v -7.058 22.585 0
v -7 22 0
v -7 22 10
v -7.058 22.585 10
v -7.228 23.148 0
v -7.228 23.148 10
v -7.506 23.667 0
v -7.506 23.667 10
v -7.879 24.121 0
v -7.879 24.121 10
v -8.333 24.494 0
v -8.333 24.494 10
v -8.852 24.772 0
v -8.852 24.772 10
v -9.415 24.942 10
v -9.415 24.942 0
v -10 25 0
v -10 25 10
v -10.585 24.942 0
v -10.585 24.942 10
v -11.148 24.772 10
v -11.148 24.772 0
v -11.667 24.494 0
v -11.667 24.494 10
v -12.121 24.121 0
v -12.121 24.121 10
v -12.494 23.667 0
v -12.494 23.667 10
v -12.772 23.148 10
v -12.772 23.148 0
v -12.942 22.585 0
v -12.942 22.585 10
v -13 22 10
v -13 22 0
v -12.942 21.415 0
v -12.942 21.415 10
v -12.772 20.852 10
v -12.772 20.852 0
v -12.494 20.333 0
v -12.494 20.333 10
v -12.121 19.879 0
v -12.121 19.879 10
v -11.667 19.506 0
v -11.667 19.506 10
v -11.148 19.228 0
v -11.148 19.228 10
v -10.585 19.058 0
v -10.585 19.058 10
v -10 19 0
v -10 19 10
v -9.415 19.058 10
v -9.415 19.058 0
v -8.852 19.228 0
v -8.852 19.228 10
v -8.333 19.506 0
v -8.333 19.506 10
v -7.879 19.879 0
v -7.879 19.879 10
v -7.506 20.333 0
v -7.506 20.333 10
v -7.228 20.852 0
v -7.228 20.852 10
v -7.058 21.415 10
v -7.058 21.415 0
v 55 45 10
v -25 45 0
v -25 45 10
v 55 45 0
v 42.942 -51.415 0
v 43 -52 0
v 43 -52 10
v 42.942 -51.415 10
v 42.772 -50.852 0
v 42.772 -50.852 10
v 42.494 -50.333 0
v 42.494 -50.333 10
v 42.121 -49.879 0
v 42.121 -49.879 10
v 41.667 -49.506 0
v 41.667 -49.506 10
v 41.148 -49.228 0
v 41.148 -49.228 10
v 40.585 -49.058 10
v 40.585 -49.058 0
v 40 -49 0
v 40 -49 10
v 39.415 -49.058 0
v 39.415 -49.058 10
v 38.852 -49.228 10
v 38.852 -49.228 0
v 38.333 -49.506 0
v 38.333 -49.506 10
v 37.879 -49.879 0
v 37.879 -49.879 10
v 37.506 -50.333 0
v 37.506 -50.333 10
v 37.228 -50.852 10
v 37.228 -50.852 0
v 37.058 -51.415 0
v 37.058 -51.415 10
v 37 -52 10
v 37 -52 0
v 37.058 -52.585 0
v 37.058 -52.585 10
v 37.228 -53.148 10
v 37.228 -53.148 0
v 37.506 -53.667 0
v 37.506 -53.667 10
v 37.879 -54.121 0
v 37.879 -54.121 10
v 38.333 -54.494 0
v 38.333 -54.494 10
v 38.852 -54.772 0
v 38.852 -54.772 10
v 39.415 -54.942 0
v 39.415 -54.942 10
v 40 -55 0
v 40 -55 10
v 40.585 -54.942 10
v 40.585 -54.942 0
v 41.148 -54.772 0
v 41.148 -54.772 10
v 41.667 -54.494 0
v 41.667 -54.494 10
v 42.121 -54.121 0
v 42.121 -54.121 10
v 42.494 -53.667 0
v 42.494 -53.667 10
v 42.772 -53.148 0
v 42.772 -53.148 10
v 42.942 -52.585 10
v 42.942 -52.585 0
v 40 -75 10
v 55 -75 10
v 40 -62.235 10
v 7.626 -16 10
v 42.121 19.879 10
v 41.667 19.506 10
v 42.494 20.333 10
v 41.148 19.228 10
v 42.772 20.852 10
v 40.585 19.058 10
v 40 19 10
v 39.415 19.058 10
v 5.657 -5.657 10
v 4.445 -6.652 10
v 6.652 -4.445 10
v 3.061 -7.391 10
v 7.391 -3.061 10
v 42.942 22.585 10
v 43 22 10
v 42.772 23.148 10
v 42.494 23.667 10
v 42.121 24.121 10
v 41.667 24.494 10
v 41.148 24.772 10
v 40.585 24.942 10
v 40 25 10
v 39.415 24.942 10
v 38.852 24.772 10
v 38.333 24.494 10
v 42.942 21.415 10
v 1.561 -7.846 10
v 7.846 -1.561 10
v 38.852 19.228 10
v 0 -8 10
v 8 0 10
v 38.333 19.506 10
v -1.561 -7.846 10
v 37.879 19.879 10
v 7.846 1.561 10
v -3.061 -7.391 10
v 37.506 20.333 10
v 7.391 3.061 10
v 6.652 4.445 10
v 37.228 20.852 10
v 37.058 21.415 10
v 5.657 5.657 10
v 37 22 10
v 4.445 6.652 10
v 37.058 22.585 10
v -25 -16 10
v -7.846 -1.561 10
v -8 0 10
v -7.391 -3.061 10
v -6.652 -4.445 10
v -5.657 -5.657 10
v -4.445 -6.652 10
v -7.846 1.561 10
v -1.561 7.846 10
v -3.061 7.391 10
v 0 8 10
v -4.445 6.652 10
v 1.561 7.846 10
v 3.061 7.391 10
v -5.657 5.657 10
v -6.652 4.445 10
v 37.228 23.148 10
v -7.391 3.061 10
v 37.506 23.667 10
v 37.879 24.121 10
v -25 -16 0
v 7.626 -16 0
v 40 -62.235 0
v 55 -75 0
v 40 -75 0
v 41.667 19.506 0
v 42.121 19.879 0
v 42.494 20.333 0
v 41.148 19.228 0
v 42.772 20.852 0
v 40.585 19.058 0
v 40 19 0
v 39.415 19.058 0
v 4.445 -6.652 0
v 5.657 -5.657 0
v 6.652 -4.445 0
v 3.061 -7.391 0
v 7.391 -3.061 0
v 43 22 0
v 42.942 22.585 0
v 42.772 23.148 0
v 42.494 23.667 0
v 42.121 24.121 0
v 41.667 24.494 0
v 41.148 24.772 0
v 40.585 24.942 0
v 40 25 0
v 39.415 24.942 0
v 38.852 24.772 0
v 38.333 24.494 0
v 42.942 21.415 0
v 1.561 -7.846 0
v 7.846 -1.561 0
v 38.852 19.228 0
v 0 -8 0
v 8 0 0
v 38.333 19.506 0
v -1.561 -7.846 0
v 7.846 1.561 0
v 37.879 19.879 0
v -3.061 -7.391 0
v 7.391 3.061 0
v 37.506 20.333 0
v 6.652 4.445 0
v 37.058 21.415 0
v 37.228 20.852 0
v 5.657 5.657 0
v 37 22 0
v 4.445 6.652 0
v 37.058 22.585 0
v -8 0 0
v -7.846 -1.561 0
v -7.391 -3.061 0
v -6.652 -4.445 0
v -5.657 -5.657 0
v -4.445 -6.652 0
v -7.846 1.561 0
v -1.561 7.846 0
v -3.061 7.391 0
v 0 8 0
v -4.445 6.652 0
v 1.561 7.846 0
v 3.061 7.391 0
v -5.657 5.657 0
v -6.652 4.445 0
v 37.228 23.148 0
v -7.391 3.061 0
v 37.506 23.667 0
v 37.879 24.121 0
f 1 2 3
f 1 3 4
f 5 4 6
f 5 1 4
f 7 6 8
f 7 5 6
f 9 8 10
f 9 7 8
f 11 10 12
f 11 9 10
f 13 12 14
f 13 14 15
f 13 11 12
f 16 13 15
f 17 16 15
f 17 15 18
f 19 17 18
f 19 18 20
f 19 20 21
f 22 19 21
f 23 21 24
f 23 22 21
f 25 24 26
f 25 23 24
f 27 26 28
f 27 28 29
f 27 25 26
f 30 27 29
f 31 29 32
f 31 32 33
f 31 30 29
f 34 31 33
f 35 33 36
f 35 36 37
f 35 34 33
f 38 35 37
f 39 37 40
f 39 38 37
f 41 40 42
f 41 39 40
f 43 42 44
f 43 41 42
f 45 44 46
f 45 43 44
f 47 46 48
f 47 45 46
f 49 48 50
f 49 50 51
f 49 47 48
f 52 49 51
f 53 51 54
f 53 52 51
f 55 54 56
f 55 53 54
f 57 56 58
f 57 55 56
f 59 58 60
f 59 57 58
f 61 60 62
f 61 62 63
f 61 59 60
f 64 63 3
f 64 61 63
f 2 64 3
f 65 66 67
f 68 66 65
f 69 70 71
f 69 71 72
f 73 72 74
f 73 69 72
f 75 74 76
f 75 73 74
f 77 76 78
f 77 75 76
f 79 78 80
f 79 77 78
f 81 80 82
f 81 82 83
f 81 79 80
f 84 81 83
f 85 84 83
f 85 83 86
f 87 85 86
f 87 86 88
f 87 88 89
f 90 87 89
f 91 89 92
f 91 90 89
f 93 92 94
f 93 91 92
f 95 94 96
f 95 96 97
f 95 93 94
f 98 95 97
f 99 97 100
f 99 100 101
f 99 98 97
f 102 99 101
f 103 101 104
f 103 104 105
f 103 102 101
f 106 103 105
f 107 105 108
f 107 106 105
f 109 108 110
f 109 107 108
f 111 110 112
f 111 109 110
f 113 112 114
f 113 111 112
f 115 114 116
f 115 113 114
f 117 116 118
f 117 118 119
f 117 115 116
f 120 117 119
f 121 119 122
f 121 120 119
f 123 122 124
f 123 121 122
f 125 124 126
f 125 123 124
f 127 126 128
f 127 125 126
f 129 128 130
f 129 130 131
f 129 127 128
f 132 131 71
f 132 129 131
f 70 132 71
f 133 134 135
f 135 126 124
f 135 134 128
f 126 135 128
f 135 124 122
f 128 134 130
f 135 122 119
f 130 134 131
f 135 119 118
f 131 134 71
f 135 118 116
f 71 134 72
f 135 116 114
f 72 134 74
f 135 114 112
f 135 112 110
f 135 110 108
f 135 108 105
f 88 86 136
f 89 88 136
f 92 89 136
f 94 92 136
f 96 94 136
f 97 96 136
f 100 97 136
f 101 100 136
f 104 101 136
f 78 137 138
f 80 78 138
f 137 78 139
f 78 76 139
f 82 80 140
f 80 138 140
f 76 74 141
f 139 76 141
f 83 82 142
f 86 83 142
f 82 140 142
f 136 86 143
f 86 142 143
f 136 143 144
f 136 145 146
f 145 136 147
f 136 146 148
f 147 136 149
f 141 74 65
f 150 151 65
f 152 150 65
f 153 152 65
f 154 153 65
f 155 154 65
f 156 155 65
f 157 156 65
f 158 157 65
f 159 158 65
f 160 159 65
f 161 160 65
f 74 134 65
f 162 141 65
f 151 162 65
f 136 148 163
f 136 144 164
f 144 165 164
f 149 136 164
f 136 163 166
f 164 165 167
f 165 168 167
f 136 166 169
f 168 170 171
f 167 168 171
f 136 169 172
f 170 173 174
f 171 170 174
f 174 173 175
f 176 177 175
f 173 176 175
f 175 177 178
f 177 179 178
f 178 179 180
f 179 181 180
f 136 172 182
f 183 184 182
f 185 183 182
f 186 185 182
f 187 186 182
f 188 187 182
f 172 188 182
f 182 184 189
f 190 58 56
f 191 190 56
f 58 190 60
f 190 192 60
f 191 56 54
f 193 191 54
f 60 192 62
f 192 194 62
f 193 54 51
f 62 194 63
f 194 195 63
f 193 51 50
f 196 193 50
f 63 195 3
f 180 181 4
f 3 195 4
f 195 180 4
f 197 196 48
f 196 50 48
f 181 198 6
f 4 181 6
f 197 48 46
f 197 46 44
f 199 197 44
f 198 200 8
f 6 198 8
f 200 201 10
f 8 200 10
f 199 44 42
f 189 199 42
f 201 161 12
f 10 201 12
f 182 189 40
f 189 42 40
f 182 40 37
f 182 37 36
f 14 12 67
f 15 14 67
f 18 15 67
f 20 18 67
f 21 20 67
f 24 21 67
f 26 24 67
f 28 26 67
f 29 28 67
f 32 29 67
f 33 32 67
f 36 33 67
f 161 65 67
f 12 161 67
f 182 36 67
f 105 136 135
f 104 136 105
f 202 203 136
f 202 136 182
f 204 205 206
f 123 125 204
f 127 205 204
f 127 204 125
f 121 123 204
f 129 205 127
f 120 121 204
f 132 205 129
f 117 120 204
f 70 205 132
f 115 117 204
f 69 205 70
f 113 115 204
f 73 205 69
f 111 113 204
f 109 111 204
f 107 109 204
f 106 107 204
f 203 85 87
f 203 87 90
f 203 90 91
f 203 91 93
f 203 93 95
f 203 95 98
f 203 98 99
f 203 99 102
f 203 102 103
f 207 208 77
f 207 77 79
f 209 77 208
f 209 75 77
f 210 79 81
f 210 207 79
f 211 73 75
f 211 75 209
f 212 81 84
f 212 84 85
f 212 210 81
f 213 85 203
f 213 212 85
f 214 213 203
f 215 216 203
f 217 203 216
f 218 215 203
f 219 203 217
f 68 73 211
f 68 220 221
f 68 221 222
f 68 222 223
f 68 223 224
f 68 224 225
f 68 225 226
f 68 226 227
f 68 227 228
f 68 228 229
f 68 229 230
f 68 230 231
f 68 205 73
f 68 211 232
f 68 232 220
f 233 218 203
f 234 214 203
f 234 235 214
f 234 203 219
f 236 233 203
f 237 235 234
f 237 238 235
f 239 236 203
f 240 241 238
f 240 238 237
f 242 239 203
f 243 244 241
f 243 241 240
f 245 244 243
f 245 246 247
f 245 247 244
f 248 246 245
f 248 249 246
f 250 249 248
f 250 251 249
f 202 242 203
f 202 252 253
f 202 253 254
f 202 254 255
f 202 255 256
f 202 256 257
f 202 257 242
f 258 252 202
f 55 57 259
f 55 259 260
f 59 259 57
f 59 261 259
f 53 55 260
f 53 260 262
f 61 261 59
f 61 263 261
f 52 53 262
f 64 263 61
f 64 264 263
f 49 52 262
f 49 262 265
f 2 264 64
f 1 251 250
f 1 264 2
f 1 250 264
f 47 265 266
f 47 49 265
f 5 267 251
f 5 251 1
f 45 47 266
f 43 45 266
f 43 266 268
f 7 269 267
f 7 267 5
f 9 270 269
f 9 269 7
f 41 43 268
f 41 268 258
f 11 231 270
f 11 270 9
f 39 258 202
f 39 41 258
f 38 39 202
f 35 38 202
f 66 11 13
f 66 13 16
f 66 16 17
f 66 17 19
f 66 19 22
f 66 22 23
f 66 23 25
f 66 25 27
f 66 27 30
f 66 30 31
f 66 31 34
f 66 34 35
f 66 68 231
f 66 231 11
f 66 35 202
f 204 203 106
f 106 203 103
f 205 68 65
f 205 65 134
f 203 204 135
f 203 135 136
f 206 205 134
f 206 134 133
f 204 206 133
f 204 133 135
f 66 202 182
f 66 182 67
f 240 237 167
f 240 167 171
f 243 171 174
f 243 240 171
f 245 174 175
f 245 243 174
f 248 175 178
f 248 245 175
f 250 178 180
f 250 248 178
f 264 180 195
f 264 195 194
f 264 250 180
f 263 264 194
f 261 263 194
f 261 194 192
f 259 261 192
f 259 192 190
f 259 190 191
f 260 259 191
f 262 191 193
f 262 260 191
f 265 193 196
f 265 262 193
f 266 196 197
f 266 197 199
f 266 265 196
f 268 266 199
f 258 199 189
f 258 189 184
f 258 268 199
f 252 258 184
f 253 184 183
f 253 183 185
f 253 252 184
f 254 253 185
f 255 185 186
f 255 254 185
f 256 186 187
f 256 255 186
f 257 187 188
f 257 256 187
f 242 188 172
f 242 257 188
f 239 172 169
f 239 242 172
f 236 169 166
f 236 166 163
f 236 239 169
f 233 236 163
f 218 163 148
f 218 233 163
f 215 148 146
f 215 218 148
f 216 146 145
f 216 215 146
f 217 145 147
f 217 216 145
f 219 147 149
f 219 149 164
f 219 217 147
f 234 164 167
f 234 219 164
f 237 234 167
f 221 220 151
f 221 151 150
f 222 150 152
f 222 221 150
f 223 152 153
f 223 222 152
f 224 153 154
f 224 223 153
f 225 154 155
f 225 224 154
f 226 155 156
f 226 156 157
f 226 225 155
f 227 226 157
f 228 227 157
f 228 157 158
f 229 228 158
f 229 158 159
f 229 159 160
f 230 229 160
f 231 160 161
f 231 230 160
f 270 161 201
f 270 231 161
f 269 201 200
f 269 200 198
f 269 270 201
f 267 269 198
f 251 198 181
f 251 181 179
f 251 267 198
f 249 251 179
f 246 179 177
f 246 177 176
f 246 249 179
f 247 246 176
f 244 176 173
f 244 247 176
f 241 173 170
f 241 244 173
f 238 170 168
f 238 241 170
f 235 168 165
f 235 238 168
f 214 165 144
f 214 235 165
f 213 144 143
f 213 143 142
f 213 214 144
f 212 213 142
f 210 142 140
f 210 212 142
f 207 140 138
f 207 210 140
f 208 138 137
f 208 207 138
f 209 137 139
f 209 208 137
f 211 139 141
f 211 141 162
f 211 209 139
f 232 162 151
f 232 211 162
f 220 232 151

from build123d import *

# Parameters (mm, degrees)
SKETCH_R   = 8
SKETCH_R_2 = 3
PAD_DEPTH  = 10


with BuildPart() as part:
    # Sketch → Pad (new body)
    with BuildSketch(Plane.XY):
        Polygon((-25, 45), (55, 45), (55, -75), (40, -75), (40, -62.235413), (7.625615, -16), (-25, -16), align=None)
        Circle(SKETCH_R, mode=Mode.SUBTRACT)
        with Locations((40, -52)):
            Circle(SKETCH_R_2, mode=Mode.SUBTRACT)
        with Locations((40, 22)):
            Circle(SKETCH_R_2, mode=Mode.SUBTRACT)
        with Locations((-10, 22)):
            Circle(SKETCH_R_2, mode=Mode.SUBTRACT)
    extrude(amount=PAD_DEPTH)


solid = part.part
